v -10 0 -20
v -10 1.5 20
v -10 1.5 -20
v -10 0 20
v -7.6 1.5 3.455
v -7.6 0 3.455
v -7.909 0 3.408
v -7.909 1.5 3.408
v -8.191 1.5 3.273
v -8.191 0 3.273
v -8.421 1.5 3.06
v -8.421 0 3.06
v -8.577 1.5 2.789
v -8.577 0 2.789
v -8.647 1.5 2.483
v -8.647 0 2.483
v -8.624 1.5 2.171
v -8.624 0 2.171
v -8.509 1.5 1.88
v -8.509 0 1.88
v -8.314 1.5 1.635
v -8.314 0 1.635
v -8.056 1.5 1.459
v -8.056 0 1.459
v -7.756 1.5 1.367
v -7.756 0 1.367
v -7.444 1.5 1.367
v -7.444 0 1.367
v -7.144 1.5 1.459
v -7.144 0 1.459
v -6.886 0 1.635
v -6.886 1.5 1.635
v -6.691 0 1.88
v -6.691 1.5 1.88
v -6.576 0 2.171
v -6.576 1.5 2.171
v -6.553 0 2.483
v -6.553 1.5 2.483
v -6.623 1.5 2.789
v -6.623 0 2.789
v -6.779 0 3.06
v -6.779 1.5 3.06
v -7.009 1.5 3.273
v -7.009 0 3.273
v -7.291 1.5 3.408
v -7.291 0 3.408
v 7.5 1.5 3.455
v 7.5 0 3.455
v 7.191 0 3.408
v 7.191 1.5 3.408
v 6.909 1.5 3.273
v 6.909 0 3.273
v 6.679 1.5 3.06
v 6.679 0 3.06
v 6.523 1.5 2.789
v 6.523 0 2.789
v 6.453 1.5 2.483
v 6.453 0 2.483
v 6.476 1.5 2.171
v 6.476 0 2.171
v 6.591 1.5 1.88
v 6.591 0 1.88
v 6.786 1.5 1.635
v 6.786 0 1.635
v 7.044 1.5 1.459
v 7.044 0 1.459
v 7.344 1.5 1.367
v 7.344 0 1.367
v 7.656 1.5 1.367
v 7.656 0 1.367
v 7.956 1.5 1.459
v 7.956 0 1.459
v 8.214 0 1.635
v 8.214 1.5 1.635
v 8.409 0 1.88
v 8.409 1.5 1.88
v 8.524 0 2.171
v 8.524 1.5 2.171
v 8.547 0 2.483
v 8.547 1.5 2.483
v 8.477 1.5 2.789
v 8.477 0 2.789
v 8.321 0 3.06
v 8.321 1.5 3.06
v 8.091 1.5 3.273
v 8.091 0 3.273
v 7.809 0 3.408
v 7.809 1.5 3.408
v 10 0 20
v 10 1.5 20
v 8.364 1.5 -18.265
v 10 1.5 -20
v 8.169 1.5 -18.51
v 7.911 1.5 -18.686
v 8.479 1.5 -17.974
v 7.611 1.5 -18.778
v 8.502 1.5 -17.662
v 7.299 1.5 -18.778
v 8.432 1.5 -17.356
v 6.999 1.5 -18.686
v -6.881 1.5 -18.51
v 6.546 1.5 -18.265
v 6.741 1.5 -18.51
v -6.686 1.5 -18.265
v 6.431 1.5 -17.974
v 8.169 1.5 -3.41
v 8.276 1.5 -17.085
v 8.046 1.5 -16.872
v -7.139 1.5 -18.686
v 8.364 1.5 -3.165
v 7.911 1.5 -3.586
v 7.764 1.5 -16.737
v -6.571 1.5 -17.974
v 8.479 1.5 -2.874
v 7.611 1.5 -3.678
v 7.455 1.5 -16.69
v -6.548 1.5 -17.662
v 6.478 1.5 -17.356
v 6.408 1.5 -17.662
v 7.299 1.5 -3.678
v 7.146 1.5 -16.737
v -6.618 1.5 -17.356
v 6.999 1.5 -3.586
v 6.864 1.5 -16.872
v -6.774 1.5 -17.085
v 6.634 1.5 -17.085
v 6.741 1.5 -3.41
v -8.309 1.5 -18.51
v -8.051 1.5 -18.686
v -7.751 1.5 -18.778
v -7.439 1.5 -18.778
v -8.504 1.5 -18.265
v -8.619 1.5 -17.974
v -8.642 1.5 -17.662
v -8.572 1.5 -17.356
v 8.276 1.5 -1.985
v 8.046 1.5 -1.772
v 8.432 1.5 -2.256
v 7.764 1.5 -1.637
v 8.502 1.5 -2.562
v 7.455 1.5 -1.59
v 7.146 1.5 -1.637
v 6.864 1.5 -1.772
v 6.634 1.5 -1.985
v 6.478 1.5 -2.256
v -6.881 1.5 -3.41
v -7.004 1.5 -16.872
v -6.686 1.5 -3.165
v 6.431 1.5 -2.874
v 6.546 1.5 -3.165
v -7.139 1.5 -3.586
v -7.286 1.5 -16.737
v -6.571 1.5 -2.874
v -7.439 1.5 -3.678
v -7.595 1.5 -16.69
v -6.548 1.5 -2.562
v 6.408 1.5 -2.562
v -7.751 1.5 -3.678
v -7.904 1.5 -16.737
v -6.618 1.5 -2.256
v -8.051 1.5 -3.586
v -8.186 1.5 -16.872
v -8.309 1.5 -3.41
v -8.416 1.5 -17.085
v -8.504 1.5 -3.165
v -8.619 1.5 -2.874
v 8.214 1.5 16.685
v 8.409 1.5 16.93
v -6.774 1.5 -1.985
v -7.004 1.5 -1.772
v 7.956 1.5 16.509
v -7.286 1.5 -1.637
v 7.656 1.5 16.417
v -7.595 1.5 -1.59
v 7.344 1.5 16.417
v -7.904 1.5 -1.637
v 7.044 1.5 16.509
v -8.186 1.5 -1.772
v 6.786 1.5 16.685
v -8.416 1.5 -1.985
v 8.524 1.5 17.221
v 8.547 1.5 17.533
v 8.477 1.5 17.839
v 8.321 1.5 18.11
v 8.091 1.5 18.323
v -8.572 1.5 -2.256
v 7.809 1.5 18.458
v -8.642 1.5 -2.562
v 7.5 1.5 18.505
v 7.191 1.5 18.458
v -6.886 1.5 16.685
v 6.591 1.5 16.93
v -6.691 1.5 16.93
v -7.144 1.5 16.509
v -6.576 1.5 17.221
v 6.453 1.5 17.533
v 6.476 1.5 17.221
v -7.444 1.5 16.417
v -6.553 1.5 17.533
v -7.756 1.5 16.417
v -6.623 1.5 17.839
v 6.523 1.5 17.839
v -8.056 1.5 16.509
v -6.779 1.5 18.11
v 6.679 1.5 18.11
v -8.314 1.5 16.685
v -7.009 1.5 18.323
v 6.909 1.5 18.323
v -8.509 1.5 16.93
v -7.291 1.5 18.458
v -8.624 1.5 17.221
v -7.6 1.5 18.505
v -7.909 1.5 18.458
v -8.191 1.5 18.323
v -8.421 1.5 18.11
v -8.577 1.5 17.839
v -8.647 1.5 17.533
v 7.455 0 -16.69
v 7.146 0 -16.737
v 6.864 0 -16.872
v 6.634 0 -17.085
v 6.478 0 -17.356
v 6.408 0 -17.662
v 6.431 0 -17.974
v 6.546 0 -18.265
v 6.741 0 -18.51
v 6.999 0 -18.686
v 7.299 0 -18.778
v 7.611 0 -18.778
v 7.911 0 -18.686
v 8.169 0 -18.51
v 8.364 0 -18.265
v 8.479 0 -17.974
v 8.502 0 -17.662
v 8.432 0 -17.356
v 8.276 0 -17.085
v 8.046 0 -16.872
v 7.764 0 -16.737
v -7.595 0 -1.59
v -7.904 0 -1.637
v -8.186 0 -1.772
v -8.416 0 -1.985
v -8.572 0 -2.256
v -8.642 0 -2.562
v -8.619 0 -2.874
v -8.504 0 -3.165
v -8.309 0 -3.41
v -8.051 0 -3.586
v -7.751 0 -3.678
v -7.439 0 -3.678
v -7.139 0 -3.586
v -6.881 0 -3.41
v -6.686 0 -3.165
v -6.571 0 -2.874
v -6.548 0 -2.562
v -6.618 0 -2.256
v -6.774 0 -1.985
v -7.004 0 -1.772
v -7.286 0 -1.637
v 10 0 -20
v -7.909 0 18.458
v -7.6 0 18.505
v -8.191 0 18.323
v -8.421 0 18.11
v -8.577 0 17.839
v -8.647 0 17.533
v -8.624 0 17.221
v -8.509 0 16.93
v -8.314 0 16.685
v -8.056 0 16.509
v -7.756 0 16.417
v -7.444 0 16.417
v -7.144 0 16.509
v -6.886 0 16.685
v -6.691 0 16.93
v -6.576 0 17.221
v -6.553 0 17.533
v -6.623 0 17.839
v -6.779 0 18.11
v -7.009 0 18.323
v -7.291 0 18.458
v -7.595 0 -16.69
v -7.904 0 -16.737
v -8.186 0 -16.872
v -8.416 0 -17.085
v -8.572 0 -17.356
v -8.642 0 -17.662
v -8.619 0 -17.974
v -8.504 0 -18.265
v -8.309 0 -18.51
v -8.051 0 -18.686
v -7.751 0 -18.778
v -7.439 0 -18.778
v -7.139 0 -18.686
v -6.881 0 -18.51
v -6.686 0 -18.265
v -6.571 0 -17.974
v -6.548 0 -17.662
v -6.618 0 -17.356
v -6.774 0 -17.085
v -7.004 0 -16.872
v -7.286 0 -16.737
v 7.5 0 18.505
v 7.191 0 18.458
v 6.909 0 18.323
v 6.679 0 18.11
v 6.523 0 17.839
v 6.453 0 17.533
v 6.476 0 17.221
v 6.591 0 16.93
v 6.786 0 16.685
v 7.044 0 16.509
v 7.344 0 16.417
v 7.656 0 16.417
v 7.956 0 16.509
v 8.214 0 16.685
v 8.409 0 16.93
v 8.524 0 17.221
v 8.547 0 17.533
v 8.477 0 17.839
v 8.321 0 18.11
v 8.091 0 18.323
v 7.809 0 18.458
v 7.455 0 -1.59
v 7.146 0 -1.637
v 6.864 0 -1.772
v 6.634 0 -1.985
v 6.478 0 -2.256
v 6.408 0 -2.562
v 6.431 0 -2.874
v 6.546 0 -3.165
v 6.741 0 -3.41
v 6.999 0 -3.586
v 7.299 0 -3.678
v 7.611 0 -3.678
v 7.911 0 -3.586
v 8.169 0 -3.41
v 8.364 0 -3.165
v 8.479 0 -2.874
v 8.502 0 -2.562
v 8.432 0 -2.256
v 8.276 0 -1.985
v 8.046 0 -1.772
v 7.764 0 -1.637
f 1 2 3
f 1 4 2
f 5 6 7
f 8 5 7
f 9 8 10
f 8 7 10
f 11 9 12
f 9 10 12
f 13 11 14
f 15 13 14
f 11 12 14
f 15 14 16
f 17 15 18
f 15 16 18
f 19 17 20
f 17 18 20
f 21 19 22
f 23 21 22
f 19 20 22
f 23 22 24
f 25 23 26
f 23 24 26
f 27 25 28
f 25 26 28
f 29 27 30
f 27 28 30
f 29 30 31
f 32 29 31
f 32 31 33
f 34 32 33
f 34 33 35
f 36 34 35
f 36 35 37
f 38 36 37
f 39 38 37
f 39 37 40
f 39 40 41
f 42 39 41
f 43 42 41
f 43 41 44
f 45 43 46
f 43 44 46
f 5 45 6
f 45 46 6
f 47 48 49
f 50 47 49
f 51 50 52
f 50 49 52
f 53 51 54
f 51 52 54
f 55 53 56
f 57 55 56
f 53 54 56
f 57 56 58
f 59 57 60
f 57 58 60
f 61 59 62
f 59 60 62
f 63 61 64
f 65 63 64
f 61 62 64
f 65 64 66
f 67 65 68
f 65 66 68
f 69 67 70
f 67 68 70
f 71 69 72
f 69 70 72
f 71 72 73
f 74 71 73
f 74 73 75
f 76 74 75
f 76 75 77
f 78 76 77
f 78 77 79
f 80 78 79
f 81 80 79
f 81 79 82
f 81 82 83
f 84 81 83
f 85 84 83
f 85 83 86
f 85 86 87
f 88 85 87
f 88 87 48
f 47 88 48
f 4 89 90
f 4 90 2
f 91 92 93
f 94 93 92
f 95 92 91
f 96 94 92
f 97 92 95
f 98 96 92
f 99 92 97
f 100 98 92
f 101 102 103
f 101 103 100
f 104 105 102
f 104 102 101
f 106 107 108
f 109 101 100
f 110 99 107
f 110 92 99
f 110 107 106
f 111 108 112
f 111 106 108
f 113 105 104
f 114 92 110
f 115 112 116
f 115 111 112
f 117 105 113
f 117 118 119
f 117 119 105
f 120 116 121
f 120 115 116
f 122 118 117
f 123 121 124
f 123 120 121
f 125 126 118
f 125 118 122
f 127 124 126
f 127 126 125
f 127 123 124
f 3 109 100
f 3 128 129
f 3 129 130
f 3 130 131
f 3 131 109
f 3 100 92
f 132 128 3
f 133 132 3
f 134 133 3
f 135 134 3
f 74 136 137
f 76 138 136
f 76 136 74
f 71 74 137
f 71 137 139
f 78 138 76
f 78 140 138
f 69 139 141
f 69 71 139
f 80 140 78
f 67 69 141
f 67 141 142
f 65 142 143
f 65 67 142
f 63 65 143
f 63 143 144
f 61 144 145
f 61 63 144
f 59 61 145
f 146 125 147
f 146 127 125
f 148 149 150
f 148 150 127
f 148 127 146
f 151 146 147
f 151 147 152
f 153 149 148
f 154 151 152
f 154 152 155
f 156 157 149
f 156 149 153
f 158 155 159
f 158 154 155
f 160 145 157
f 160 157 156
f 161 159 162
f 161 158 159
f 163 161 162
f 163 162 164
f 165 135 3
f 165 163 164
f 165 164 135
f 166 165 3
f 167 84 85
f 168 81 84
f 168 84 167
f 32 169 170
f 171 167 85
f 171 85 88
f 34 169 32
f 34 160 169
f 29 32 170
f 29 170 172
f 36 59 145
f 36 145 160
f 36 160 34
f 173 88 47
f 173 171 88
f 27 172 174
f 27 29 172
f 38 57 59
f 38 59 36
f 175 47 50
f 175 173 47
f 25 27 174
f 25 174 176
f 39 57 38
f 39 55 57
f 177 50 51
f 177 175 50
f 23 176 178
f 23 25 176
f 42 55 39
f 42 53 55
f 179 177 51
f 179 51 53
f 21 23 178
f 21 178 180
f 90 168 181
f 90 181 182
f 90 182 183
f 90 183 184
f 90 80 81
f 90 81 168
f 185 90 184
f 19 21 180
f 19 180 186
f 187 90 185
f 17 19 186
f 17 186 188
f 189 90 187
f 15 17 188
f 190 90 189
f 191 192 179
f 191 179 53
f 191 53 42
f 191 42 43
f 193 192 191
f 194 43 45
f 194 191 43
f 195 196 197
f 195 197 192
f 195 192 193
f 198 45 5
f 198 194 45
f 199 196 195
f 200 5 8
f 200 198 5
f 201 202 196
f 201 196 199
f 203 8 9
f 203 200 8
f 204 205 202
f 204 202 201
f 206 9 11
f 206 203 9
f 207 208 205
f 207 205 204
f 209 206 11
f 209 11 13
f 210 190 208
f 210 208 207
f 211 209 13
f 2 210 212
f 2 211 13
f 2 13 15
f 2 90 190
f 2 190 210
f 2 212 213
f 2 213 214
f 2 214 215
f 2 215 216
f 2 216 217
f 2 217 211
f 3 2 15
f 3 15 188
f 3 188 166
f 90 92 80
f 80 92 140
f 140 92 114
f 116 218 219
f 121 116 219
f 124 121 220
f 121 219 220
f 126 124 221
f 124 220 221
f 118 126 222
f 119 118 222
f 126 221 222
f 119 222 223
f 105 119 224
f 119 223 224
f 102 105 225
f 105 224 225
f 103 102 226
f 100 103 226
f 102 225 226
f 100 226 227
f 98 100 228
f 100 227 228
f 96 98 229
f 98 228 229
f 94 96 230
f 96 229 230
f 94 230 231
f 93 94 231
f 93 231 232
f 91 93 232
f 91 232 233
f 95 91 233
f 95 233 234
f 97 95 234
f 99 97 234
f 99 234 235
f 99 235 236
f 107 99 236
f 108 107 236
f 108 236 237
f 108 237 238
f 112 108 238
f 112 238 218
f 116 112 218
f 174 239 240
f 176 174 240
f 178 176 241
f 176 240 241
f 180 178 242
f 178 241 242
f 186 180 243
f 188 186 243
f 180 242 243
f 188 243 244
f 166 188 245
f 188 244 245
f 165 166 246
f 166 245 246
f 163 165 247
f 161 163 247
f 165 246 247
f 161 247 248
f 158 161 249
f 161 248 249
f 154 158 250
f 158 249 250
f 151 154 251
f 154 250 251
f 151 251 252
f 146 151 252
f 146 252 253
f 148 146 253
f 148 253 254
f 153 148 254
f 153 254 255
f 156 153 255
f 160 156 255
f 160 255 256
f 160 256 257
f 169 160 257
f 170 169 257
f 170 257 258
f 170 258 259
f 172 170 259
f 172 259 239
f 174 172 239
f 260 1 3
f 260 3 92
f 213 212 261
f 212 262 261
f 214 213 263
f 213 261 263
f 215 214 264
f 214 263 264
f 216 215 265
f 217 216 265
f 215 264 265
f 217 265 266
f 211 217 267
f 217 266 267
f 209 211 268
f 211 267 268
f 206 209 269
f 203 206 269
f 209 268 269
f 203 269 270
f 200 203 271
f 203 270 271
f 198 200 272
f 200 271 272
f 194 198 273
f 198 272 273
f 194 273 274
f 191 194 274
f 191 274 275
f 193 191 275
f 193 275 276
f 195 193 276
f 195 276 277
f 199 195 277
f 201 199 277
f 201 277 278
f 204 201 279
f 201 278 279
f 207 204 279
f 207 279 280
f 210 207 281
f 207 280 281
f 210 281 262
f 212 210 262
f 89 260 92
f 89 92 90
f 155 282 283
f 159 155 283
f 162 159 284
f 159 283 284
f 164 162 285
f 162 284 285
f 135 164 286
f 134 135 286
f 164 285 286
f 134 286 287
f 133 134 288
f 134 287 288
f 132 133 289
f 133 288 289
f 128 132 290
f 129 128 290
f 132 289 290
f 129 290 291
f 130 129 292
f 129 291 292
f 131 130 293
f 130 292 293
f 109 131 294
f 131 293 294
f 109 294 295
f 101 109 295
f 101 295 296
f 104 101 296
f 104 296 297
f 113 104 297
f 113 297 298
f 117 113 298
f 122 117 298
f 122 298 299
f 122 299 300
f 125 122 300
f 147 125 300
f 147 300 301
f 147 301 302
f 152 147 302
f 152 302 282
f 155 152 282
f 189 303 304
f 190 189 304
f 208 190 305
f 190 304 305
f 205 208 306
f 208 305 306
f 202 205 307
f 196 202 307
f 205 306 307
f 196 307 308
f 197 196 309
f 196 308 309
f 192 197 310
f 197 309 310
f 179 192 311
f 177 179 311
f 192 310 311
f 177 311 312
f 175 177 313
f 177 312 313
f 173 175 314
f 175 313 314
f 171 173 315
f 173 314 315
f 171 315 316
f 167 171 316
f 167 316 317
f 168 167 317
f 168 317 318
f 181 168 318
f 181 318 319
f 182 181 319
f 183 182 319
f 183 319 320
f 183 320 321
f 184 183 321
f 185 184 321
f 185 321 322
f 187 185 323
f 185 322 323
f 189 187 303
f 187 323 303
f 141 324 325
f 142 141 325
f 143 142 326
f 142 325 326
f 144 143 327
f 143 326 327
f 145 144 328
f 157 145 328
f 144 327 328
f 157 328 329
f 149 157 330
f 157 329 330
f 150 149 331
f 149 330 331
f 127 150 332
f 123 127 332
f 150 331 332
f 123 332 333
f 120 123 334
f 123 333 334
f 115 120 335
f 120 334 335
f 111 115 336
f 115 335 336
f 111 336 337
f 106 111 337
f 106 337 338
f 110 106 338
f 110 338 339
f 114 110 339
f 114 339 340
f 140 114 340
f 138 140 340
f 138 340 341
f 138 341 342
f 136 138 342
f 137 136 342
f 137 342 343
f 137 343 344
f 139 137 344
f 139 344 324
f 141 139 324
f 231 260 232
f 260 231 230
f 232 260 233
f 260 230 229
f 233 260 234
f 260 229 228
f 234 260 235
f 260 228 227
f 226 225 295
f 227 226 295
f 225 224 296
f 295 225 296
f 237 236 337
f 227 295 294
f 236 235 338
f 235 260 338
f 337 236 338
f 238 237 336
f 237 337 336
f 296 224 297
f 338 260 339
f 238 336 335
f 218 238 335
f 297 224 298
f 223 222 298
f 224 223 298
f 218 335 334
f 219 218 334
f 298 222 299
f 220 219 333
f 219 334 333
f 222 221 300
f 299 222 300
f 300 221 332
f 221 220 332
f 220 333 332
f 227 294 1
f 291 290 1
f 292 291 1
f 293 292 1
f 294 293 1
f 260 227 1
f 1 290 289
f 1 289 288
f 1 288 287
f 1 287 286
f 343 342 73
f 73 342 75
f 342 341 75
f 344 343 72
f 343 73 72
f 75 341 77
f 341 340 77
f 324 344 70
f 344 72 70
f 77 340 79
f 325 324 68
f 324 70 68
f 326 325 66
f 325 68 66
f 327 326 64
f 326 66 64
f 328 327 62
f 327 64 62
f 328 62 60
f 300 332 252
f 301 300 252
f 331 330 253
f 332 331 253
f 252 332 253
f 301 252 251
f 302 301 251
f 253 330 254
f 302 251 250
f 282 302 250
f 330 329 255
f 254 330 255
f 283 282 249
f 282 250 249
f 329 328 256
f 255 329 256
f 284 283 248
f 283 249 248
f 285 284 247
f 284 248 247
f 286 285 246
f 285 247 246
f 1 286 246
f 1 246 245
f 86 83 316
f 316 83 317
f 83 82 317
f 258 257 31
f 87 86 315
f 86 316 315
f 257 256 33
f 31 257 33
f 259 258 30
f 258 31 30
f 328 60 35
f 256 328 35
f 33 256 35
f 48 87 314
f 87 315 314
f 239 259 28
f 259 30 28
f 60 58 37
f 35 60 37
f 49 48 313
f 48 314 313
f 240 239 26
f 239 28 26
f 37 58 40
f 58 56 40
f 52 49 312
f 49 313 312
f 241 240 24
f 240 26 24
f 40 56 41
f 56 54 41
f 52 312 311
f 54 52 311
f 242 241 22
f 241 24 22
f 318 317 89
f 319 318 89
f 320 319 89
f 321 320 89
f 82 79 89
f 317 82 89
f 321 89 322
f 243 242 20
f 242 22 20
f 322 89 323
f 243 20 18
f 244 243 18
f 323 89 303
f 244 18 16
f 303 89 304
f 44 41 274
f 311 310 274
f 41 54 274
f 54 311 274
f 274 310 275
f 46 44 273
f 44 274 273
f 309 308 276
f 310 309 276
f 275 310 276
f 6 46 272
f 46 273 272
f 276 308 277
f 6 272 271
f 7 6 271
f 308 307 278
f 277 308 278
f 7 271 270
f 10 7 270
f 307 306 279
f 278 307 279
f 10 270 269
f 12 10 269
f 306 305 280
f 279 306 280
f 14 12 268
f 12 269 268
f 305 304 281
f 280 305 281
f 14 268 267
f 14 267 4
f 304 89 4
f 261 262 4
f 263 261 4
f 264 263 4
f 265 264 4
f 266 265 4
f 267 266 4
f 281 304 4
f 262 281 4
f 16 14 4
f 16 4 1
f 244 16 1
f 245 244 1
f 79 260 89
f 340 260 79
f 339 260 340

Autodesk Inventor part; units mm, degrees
ref_plane "YZ Plane" through (0, 0, 0) normal (1, 0, 0) x (0, 1, 0)
ref_plane "XZ Plane" through (0, 0, 0) normal (0, 1, 0) x (-1, 0, 0)
ref_plane "XY Plane" through (0, 0, 0) normal (0, 0, 1) x (1, 0, 0)
sketch "Sketch1" plane through (0, 0, 0) normal (0, 1, 0) x (-1, 0, 0)
  line L0 (-10, 20) -> (10, 20)
  line L1 (10, 20) -> (10, -20)
  line L2 (10, -20) -> (-10, -20)
  line L3 (-10, -20) -> (-10, 20)
  line L4 (-10, 20) -> (10, -20) construction
  line L5 (10, 20) -> (-10, -20) construction
  point P0 (0, 0)
  dimension "d0" = 40
  dimension "d1" = 20
extrude "Plate1" add sketch "Sketch1" along normal blind 1.5
sketch "Sketch2" plane through (0, 1.5, 0) normal (0, 1, 0) x (1, 0, 0)
  circle A0 centre (-7.6, -17.455) radius 0.7835 projected
  line L0 (10, 20) -> (10, -20) projected
  line L1 (-10, 20) -> (10, 20) projected
  line L2 (-10, -20) -> (-10, 20) projected
  line L3 (10, -20) -> (-10, -20) projected
  circle A1 centre (-7.6, -2.405) radius 0.7835 projected
  circle A2 centre (7.5, -2.405) radius 0.7835 projected
  circle A3 centre (7.5, -17.455) radius 0.7835 projected
  point P0 (0, 0)
sketch "Sketch3" plane through (0, 1.5, 0) normal (0, 1, 0) x (1, 0, 0)
  circle A0 centre (-7.595, 2.64) radius 0.7835 projected
  circle A1 centre (7.455, 2.64) radius 0.7835 projected
  circle A2 centre (-7.595, 17.74) radius 0.7835 projected
  line L0 (10, 20) -> (10, -20) projected
  line L1 (-10, 20) -> (10, 20) projected
  line L2 (-10, -20) -> (-10, 20) projected
  line L3 (10, -20) -> (-10, -20) projected
  circle A3 centre (7.455, 17.74) radius 0.7835 projected
  point P0 (0, 0)
hole "Hole1" at (-7.595, 1.5, -17.74) at (7.455, 1.5, -17.74) at (7.455, 1.5, -2.64) at (-7.595, 1.5, -2.64) direction (0, -1, 0) diameter 2.1 depth 1.5
hole "Hole2" at (-7.6, 1.5, 2.405) at (7.5, 1.5, 2.405) at (7.5, 1.5, 17.455) at (-7.6, 1.5, 17.455) direction (0, -1, 0) diameter 2.1 depth 1.5
equation "\"d8\" = Thickness"
equation "\"d15\" = Thickness"
equation "\"d2\" = Thickness"
equation "\"BendReliefWidth\" = Thickness"
equation "\"BendReliefDepth\" = 0.5 * Thickness"
equation "\"CornerReliefSize\" = 4 * Thickness"
equation "\"MinimumRemnant\" = 2 * Thickness"
equation "\"TransitionRadius\" = BendRadius"
equation "\"JacobiRadiusSize\" = BendRadius"
equation "\"GapSize\" = Thickness"
equation "\"Thickness\" = 1.5"
equation "\"BendRadius\" = 0.31"
properties part number "axis_22_bottom_frame(middle)" material "Aluminum 6061-AHC"
